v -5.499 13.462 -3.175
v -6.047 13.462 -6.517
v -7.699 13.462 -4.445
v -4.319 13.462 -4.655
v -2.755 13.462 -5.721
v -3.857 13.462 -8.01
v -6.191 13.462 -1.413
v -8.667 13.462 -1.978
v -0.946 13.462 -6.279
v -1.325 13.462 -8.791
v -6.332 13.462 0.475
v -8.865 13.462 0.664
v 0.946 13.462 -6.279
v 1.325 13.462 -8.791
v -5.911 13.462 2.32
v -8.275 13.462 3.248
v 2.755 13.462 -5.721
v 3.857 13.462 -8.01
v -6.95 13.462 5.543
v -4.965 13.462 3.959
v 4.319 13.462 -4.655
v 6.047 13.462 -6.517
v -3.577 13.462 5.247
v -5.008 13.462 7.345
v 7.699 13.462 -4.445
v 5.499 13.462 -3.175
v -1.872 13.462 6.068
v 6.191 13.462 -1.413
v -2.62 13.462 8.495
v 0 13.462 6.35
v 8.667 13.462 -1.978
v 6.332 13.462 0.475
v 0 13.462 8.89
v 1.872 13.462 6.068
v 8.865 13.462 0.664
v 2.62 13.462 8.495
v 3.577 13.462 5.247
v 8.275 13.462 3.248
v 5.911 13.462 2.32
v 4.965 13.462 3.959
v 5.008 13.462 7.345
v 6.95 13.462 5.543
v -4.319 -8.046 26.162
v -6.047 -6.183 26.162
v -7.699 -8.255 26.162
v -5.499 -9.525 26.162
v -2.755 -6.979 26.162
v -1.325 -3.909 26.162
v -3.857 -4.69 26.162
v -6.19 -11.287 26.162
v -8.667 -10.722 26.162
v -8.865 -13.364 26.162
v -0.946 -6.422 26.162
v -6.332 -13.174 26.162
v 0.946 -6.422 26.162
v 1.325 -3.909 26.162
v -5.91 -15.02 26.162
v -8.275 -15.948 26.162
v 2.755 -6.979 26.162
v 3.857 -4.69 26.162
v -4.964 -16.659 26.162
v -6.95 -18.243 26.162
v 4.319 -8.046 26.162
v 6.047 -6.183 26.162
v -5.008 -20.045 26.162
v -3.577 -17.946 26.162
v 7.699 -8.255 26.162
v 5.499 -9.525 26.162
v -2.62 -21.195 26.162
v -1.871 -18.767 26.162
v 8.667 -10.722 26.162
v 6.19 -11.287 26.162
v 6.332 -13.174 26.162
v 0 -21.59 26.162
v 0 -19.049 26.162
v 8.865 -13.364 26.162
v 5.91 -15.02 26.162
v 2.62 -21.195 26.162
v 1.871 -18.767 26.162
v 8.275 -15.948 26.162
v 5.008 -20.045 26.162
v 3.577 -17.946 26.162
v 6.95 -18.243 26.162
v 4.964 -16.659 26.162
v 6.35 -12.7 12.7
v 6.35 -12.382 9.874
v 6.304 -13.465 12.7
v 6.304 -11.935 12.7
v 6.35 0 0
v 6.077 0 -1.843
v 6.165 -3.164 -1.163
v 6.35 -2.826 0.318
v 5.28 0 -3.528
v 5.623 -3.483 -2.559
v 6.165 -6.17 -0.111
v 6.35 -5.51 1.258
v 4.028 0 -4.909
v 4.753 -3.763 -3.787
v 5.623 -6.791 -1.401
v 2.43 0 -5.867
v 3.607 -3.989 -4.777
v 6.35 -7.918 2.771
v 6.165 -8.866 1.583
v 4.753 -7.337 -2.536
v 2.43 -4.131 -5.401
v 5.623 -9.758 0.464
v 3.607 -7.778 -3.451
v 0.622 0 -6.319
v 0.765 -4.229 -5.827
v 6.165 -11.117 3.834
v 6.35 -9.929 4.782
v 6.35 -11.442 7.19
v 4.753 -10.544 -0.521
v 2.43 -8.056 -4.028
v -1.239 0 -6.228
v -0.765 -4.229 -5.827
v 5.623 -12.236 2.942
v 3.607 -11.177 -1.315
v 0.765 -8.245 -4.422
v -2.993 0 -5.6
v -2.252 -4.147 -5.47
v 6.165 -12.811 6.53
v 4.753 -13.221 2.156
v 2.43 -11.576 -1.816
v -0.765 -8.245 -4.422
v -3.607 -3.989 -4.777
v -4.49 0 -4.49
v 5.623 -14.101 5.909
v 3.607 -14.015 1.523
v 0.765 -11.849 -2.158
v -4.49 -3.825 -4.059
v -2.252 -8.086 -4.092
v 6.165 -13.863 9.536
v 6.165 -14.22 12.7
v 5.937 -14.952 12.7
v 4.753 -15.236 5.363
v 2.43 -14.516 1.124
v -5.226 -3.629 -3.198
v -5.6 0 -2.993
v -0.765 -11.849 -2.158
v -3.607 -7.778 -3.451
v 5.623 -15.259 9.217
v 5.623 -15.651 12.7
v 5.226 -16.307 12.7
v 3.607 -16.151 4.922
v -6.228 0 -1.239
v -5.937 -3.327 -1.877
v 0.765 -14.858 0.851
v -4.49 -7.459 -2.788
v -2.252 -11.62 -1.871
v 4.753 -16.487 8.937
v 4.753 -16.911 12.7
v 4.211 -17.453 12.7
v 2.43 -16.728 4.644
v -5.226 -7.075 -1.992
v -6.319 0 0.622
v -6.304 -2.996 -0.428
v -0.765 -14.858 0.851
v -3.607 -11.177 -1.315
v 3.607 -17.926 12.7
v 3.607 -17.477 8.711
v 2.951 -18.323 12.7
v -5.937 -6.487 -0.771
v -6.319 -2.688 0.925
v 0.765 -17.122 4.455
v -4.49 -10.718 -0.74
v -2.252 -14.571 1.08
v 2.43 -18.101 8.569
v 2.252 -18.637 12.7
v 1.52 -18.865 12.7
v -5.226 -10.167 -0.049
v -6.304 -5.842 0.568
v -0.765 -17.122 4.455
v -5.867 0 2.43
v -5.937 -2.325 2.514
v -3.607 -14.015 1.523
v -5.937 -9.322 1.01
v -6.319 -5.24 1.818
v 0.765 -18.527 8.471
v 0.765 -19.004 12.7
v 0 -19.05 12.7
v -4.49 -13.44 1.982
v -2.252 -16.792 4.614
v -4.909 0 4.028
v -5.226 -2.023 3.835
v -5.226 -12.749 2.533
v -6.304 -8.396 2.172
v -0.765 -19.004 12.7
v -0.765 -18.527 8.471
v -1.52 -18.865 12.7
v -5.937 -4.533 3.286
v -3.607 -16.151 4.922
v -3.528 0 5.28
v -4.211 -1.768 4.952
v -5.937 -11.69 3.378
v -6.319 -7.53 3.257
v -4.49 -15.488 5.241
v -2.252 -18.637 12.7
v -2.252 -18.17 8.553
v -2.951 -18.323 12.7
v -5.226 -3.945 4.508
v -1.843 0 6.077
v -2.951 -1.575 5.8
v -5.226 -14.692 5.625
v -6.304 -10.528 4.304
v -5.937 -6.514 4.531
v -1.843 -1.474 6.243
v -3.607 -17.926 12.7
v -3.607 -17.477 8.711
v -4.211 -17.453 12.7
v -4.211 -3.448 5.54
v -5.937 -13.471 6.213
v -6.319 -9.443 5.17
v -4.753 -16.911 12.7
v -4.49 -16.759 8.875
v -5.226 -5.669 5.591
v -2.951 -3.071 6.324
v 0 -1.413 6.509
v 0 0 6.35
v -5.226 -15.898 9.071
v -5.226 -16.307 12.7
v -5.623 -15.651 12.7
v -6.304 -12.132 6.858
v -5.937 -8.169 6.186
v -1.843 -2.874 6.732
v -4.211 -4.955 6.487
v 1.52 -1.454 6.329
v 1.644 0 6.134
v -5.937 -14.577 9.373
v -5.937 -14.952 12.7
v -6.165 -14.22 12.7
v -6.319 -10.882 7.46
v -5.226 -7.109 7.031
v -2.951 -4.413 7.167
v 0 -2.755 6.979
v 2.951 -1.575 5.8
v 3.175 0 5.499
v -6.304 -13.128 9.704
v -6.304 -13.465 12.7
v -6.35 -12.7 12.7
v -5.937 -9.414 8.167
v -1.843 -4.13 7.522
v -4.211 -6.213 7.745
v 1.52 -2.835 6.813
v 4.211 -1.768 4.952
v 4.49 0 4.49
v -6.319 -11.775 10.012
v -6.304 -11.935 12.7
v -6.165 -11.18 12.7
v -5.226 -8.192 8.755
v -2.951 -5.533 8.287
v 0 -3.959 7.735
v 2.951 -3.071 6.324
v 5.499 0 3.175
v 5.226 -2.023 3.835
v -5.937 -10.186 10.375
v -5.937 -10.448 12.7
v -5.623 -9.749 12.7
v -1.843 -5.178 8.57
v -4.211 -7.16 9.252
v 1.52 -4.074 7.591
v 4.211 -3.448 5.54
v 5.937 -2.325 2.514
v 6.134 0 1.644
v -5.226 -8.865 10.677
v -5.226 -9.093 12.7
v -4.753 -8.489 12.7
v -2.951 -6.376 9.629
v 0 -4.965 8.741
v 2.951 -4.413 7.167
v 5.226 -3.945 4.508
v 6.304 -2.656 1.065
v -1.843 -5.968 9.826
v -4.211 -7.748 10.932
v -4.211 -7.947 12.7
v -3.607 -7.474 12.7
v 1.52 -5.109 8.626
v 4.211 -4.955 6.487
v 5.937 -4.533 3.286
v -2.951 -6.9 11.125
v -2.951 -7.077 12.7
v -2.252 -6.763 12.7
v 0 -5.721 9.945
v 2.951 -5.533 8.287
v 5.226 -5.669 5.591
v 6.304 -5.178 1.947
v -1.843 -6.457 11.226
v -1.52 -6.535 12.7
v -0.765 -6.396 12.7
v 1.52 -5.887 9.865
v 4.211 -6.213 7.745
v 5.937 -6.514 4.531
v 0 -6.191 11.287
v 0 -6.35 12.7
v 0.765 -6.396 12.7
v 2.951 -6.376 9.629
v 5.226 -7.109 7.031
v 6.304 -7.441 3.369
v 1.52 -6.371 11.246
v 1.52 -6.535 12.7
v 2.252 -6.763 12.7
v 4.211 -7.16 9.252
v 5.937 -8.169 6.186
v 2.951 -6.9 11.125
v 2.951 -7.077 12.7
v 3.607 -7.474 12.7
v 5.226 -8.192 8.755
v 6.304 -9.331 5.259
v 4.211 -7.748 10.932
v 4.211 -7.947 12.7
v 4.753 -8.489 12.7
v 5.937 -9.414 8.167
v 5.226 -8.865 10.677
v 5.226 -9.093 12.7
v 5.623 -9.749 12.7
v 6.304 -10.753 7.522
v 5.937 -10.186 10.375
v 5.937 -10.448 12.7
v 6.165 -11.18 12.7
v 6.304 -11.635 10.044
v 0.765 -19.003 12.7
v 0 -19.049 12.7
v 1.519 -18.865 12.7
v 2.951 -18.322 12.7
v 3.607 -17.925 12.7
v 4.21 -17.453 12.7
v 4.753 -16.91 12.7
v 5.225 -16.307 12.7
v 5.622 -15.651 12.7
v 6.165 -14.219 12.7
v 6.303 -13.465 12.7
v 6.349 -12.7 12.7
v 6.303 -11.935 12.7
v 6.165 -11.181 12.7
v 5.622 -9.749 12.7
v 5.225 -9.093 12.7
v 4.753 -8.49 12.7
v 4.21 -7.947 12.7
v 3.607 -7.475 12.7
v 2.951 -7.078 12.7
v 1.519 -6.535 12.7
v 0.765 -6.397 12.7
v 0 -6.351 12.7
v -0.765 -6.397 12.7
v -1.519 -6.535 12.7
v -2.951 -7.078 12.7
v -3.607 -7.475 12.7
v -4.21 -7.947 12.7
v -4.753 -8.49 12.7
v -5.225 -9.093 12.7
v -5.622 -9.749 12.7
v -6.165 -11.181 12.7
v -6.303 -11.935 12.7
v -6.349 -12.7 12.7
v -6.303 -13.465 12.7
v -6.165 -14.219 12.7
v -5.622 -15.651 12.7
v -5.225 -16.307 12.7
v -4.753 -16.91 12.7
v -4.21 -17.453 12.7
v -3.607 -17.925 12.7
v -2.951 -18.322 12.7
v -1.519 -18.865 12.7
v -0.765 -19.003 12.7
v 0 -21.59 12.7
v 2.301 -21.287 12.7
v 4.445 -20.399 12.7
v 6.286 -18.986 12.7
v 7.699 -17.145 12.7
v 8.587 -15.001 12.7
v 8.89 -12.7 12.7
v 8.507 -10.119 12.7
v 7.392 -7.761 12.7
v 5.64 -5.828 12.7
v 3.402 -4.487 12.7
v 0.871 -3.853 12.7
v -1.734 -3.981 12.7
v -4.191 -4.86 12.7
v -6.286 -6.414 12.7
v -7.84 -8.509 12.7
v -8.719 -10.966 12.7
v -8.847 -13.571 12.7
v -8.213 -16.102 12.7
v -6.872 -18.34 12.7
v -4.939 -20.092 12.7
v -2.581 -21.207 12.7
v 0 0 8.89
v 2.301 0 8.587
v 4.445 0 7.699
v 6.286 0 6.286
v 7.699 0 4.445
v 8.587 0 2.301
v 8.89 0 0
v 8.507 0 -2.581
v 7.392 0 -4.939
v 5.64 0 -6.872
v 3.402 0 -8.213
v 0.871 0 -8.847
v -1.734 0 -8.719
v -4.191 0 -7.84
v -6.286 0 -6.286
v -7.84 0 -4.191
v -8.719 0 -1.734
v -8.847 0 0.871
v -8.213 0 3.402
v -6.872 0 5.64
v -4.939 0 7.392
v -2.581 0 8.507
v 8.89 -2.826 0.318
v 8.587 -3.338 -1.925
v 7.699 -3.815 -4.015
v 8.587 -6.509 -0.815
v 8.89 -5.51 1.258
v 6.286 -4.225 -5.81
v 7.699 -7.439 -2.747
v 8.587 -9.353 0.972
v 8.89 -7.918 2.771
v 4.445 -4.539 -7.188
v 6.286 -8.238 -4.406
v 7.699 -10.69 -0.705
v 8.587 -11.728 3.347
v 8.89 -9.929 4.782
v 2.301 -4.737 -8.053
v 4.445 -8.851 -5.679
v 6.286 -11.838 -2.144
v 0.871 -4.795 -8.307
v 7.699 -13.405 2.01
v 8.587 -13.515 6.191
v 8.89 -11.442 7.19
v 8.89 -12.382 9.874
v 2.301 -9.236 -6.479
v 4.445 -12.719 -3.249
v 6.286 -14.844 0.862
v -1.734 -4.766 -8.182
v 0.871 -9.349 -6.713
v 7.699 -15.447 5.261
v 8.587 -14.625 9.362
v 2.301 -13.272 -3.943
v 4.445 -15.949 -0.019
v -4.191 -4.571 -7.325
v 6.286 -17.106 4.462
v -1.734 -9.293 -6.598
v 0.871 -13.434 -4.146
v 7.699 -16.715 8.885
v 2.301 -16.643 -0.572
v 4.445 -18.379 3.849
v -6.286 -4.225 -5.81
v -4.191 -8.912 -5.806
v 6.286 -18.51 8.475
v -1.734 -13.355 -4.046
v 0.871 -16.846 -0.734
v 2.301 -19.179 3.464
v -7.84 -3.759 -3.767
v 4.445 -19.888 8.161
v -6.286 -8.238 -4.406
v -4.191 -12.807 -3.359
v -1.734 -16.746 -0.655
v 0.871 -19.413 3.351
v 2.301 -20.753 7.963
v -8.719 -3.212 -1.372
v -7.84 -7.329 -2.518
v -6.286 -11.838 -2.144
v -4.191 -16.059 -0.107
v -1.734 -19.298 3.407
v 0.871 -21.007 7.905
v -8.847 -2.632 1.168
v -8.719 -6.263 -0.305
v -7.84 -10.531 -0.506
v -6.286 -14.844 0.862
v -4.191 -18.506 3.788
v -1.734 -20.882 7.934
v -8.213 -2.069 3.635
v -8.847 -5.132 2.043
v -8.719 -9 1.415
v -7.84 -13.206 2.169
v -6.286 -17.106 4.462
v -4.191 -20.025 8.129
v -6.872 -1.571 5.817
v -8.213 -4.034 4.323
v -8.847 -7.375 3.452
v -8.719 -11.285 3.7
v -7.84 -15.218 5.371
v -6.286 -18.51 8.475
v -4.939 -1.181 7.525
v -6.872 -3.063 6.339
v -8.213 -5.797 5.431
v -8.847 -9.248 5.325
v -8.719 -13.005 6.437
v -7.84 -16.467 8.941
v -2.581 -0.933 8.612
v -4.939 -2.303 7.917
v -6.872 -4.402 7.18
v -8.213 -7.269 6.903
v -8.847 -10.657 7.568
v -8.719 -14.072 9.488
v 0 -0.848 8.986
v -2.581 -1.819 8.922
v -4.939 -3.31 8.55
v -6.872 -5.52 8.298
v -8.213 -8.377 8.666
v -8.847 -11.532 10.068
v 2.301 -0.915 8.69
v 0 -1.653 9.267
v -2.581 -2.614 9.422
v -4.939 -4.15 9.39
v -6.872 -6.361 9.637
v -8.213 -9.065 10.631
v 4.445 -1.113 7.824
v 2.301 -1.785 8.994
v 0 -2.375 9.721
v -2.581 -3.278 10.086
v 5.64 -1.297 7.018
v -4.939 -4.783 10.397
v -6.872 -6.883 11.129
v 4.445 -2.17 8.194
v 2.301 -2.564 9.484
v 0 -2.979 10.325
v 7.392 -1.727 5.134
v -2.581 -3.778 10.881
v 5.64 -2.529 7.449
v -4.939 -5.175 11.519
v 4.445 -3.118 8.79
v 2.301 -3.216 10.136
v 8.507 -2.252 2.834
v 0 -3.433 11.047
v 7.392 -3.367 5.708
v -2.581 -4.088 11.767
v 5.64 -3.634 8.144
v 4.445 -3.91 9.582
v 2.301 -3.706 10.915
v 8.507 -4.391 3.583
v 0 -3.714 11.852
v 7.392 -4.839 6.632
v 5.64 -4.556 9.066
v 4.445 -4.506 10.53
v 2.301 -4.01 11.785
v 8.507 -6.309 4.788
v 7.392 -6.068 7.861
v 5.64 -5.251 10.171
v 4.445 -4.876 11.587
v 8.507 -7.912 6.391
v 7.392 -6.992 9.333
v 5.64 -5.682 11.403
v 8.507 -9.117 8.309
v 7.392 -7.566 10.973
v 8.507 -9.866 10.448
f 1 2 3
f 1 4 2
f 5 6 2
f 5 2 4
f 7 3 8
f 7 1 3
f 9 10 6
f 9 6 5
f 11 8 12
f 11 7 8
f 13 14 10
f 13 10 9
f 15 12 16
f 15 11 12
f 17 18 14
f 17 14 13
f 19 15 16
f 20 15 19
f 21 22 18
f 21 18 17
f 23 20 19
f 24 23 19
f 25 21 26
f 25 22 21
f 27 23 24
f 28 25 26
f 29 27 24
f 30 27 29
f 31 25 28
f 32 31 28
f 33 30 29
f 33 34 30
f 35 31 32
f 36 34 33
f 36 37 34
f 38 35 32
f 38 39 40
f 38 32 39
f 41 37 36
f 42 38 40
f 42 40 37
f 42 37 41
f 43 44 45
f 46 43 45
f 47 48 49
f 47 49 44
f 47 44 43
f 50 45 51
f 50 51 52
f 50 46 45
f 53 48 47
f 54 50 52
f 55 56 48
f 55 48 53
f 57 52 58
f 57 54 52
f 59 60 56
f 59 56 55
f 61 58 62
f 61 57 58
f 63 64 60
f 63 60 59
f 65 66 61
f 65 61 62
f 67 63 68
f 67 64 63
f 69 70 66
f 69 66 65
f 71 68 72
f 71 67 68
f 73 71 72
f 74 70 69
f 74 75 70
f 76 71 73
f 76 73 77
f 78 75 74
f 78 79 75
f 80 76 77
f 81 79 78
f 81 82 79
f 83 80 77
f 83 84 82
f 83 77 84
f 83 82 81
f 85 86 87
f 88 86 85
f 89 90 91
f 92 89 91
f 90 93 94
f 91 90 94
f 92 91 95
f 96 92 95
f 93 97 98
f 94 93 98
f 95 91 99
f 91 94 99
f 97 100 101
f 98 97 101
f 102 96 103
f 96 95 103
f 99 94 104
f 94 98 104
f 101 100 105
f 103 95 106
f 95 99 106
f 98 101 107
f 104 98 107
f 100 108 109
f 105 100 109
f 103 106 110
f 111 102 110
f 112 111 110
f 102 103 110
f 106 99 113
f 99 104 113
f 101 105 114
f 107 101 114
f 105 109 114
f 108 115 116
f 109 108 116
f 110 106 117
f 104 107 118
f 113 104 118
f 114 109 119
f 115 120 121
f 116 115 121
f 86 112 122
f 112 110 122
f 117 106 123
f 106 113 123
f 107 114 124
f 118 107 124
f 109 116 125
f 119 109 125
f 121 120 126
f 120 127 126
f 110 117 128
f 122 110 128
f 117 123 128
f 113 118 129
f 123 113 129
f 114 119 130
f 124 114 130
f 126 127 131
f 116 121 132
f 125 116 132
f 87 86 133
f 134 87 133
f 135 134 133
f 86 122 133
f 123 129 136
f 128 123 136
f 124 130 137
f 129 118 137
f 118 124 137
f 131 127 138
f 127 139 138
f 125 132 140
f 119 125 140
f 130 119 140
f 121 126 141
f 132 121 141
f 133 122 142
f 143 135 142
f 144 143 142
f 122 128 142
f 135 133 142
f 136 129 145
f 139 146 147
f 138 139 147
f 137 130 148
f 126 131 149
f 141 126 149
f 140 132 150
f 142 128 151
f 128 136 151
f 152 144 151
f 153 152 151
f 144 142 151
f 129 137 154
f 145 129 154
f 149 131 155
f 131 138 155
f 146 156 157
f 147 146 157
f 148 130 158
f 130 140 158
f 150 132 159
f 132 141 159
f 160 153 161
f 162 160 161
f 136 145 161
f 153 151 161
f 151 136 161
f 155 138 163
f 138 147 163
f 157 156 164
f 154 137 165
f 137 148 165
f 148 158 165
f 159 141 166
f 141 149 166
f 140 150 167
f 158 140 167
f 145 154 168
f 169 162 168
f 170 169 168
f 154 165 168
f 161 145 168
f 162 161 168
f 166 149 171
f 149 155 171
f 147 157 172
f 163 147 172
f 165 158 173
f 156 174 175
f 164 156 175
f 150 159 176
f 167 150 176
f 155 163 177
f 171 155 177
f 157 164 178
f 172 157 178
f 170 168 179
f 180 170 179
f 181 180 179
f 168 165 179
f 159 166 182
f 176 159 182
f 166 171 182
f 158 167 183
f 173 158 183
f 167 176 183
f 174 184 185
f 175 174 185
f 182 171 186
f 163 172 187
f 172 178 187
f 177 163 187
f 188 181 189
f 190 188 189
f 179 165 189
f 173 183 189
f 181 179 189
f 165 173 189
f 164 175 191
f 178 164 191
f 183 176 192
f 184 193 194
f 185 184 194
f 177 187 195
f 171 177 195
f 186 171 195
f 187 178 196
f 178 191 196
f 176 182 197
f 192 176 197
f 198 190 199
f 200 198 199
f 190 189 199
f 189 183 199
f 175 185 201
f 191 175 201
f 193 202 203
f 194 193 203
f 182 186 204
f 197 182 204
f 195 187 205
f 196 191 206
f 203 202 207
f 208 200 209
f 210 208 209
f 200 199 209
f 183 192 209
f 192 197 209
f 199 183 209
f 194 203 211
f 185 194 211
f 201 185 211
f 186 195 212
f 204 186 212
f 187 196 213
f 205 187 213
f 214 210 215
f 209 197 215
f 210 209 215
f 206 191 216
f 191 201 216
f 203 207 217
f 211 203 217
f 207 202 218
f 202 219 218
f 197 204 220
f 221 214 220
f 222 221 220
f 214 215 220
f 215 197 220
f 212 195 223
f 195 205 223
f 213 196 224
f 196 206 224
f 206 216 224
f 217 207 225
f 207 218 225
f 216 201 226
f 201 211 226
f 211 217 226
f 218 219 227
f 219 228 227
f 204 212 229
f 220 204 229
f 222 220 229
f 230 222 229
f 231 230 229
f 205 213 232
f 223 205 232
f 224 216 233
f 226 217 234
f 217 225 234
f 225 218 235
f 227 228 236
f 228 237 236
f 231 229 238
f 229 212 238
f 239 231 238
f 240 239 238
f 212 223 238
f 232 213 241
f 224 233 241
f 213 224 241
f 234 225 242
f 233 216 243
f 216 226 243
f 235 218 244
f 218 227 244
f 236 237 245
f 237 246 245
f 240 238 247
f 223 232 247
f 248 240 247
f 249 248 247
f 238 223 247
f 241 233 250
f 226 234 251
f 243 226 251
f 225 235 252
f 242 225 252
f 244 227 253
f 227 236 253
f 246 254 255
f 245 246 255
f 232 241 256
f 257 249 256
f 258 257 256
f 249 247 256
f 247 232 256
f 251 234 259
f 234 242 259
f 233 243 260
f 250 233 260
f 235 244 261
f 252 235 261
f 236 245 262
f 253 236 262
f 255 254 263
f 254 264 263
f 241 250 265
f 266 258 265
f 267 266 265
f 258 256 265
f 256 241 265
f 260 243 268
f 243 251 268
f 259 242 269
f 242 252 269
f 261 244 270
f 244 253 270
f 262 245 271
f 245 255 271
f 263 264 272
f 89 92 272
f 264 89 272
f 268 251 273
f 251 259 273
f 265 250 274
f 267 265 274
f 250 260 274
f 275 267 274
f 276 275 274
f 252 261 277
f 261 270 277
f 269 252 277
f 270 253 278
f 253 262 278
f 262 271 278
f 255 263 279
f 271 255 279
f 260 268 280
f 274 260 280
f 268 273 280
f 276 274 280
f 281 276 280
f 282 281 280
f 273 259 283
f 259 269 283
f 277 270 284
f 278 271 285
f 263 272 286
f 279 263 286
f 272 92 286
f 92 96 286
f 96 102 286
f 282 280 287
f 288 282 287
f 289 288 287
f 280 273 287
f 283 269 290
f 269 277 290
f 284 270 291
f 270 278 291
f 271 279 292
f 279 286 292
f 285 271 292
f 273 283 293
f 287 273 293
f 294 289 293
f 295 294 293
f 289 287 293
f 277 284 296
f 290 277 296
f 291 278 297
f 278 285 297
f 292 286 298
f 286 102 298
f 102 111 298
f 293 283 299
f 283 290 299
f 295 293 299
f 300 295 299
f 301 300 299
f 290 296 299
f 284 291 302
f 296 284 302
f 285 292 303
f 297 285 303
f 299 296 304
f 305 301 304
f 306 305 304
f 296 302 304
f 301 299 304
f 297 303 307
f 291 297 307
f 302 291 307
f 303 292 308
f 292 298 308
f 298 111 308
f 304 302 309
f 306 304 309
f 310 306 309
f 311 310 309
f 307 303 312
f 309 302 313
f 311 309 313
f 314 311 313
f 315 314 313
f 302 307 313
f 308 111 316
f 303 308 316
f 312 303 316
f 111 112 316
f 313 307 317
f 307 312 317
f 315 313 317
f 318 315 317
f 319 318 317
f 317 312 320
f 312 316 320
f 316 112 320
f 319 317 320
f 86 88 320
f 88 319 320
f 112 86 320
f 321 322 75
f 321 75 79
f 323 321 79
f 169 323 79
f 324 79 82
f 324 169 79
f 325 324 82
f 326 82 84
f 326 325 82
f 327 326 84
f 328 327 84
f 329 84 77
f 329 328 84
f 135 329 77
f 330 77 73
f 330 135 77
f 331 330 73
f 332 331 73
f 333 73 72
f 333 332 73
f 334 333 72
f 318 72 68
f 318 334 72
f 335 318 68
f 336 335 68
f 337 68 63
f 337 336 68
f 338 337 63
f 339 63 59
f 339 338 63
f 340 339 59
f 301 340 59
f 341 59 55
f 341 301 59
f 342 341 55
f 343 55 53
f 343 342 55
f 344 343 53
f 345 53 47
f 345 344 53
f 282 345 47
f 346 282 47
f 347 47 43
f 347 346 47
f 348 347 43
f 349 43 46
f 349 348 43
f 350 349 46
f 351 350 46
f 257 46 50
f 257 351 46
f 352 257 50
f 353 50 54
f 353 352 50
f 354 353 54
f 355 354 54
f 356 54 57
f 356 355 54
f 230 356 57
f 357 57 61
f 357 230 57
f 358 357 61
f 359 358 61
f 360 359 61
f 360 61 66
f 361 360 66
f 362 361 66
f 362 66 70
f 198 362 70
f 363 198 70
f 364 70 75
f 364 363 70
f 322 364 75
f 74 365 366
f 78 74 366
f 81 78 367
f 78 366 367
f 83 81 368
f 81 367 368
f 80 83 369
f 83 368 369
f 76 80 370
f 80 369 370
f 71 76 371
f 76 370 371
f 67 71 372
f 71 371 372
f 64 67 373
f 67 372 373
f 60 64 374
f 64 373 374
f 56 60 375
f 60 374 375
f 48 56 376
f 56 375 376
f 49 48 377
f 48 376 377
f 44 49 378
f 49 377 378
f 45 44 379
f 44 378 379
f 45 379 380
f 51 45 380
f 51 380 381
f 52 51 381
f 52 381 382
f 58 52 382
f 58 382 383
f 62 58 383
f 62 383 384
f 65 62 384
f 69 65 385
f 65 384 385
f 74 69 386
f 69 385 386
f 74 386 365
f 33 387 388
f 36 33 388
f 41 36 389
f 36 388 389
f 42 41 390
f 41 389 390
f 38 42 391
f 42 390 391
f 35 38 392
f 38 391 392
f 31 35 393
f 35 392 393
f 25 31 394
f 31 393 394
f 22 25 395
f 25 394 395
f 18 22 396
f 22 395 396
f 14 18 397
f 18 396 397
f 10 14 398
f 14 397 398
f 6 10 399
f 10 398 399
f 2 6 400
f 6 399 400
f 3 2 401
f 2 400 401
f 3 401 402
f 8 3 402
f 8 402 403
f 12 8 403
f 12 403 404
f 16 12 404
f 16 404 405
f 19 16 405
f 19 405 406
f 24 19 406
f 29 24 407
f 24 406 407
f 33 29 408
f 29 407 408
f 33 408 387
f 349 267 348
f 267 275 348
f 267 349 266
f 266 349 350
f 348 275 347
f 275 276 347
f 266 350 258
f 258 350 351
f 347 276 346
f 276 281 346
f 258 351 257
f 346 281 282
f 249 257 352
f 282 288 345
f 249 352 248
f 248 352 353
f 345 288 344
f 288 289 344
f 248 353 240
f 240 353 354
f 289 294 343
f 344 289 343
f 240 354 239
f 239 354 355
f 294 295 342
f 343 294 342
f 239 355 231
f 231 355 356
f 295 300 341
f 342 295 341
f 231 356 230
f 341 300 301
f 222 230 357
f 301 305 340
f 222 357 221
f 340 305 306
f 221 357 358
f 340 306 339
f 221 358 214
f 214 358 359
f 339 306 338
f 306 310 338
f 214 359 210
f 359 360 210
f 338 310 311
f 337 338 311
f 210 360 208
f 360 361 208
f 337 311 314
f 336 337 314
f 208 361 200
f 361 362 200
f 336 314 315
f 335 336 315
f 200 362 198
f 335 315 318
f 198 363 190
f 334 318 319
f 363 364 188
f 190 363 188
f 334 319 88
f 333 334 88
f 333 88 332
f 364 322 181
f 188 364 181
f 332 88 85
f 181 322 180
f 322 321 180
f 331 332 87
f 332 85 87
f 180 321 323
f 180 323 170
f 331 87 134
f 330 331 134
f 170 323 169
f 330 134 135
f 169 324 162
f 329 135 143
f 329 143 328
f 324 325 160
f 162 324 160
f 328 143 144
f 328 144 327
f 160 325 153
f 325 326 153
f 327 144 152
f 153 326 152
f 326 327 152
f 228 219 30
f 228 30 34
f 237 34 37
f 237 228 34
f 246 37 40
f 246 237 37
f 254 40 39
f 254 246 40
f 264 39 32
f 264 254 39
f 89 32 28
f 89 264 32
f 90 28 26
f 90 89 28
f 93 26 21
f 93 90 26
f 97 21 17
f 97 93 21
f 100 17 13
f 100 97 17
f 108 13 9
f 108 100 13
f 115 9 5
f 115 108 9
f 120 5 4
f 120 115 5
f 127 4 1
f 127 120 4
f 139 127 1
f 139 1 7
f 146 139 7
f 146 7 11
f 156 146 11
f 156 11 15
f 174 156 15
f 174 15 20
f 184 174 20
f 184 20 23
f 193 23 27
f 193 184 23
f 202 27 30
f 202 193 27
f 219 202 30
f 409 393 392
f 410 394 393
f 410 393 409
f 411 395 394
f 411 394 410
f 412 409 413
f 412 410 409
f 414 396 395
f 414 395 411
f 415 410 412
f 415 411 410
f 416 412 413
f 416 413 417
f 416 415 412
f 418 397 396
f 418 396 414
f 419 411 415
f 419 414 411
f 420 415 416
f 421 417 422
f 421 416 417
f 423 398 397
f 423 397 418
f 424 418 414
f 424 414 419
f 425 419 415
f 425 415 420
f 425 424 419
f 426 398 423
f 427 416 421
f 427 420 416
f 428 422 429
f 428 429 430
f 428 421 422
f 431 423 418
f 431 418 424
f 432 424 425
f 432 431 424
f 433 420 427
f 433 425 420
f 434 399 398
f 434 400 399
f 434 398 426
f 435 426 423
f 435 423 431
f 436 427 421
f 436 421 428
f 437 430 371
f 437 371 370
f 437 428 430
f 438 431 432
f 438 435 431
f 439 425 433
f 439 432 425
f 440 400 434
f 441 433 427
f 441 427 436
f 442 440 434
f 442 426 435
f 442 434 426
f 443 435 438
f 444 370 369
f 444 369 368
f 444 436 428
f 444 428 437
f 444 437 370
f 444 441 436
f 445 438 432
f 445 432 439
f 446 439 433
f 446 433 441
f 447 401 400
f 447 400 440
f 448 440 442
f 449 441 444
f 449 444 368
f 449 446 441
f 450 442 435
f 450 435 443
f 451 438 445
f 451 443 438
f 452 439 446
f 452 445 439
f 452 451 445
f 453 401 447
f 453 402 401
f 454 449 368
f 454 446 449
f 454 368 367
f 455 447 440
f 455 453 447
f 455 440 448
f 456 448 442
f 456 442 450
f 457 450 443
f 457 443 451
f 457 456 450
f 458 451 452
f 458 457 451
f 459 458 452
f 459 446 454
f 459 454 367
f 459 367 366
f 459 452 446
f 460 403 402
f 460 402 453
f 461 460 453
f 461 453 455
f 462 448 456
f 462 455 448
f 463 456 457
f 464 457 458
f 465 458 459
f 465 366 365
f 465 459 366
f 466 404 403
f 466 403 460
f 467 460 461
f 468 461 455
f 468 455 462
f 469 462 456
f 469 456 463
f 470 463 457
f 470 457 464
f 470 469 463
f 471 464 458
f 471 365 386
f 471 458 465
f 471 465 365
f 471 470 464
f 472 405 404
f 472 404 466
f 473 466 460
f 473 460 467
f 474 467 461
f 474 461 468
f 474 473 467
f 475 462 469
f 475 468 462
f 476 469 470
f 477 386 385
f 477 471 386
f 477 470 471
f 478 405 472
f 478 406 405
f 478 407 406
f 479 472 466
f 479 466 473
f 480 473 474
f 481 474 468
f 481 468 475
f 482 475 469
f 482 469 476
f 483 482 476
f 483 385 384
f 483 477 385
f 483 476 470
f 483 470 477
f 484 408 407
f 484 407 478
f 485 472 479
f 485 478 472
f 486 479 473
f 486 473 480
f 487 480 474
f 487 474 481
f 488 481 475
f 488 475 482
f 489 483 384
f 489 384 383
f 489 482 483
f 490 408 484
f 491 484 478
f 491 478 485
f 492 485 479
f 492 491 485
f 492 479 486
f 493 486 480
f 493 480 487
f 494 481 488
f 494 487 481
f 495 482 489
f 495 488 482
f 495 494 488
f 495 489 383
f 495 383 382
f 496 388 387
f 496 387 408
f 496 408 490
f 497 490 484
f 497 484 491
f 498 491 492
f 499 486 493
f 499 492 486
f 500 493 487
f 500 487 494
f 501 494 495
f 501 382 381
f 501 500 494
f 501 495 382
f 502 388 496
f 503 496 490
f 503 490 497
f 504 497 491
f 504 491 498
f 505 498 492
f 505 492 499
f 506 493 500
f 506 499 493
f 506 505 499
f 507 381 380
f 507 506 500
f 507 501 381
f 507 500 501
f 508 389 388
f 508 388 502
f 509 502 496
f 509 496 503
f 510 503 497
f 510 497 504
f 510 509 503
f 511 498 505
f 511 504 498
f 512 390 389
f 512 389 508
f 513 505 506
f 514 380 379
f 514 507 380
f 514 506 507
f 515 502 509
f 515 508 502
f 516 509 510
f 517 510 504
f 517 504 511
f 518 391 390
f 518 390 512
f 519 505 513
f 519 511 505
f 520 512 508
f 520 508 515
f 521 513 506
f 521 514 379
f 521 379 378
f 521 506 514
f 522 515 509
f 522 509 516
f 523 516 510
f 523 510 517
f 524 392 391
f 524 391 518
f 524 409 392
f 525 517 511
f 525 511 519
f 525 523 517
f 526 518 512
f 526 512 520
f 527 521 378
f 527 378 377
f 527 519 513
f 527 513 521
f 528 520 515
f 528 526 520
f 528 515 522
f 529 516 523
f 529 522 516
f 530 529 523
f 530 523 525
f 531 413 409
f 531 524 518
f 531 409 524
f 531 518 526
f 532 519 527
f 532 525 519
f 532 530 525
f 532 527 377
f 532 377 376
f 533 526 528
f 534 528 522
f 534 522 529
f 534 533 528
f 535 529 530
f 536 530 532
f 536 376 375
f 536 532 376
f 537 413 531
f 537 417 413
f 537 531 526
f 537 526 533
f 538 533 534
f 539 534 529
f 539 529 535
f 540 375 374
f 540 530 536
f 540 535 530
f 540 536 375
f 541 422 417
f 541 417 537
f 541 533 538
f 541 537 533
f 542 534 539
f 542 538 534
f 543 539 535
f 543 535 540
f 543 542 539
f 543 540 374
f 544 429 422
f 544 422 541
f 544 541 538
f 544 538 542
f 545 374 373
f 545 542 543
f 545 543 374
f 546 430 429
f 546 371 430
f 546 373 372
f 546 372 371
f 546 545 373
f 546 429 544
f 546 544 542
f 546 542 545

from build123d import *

# Parameters (mm, degrees)
SKETCH1_R           = 8.89
SKETCH1_R_2         = 6.35
BOSS_EXTRUDE1_DEPTH = 13.462
SKETCH3_R           = 8.89
SKETCH3_R_2         = 6.35
SKETCH5_R           = 8.89
SKETCH5_R_2         = 6.349329507
BOSS_EXTRUDE2_DEPTH = 13.462


with BuildPart() as part:
    # Sketch1 → Boss-Extrude1 (new body)
    with BuildSketch(Plane(origin=(0, 0, 0), x_dir=(1, 0, 0), z_dir=(0, 1, 0))):
        with Locations(Location((0, 0, 0), (0, 0, 270))):
            Circle(SKETCH1_R)
        with Locations(Location((0, 0, 0), (0, 0, 270))):
            Circle(SKETCH1_R_2, mode=Mode.SUBTRACT)
    extrude(amount=BOSS_EXTRUDE1_DEPTH)

    # Sweep1: sweep along a path in Sketch2
    with BuildLine(Plane(origin=(0, 0, 0), x_dir=(0, 0, -1), z_dir=(1, 0, 0))) as sweep1_path:
        ThreePointArc((0, 0), (-3.719743879, -8.980256121), (-12.7, -12.7))
    # Sketch3 → Sweep1 (sweep)
    with BuildSketch(Plane.XZ):
        Circle(SKETCH3_R)
        Circle(SKETCH3_R_2, mode=Mode.SUBTRACT)
    sweep(path=sweep1_path.line)

    # Sketch5 → Boss-Extrude2 (add)
    with BuildSketch(Plane.XY.offset(12.7)):
        with Locations(Location((0, -12.7, 0), (0, 0, 270))):
            Circle(SKETCH5_R)
        with Locations(Location((0, -12.7, 0), (0, 0, 270))):
            Circle(SKETCH5_R_2, mode=Mode.SUBTRACT)
    extrude(amount=BOSS_EXTRUDE2_DEPTH)


solid = part.part
